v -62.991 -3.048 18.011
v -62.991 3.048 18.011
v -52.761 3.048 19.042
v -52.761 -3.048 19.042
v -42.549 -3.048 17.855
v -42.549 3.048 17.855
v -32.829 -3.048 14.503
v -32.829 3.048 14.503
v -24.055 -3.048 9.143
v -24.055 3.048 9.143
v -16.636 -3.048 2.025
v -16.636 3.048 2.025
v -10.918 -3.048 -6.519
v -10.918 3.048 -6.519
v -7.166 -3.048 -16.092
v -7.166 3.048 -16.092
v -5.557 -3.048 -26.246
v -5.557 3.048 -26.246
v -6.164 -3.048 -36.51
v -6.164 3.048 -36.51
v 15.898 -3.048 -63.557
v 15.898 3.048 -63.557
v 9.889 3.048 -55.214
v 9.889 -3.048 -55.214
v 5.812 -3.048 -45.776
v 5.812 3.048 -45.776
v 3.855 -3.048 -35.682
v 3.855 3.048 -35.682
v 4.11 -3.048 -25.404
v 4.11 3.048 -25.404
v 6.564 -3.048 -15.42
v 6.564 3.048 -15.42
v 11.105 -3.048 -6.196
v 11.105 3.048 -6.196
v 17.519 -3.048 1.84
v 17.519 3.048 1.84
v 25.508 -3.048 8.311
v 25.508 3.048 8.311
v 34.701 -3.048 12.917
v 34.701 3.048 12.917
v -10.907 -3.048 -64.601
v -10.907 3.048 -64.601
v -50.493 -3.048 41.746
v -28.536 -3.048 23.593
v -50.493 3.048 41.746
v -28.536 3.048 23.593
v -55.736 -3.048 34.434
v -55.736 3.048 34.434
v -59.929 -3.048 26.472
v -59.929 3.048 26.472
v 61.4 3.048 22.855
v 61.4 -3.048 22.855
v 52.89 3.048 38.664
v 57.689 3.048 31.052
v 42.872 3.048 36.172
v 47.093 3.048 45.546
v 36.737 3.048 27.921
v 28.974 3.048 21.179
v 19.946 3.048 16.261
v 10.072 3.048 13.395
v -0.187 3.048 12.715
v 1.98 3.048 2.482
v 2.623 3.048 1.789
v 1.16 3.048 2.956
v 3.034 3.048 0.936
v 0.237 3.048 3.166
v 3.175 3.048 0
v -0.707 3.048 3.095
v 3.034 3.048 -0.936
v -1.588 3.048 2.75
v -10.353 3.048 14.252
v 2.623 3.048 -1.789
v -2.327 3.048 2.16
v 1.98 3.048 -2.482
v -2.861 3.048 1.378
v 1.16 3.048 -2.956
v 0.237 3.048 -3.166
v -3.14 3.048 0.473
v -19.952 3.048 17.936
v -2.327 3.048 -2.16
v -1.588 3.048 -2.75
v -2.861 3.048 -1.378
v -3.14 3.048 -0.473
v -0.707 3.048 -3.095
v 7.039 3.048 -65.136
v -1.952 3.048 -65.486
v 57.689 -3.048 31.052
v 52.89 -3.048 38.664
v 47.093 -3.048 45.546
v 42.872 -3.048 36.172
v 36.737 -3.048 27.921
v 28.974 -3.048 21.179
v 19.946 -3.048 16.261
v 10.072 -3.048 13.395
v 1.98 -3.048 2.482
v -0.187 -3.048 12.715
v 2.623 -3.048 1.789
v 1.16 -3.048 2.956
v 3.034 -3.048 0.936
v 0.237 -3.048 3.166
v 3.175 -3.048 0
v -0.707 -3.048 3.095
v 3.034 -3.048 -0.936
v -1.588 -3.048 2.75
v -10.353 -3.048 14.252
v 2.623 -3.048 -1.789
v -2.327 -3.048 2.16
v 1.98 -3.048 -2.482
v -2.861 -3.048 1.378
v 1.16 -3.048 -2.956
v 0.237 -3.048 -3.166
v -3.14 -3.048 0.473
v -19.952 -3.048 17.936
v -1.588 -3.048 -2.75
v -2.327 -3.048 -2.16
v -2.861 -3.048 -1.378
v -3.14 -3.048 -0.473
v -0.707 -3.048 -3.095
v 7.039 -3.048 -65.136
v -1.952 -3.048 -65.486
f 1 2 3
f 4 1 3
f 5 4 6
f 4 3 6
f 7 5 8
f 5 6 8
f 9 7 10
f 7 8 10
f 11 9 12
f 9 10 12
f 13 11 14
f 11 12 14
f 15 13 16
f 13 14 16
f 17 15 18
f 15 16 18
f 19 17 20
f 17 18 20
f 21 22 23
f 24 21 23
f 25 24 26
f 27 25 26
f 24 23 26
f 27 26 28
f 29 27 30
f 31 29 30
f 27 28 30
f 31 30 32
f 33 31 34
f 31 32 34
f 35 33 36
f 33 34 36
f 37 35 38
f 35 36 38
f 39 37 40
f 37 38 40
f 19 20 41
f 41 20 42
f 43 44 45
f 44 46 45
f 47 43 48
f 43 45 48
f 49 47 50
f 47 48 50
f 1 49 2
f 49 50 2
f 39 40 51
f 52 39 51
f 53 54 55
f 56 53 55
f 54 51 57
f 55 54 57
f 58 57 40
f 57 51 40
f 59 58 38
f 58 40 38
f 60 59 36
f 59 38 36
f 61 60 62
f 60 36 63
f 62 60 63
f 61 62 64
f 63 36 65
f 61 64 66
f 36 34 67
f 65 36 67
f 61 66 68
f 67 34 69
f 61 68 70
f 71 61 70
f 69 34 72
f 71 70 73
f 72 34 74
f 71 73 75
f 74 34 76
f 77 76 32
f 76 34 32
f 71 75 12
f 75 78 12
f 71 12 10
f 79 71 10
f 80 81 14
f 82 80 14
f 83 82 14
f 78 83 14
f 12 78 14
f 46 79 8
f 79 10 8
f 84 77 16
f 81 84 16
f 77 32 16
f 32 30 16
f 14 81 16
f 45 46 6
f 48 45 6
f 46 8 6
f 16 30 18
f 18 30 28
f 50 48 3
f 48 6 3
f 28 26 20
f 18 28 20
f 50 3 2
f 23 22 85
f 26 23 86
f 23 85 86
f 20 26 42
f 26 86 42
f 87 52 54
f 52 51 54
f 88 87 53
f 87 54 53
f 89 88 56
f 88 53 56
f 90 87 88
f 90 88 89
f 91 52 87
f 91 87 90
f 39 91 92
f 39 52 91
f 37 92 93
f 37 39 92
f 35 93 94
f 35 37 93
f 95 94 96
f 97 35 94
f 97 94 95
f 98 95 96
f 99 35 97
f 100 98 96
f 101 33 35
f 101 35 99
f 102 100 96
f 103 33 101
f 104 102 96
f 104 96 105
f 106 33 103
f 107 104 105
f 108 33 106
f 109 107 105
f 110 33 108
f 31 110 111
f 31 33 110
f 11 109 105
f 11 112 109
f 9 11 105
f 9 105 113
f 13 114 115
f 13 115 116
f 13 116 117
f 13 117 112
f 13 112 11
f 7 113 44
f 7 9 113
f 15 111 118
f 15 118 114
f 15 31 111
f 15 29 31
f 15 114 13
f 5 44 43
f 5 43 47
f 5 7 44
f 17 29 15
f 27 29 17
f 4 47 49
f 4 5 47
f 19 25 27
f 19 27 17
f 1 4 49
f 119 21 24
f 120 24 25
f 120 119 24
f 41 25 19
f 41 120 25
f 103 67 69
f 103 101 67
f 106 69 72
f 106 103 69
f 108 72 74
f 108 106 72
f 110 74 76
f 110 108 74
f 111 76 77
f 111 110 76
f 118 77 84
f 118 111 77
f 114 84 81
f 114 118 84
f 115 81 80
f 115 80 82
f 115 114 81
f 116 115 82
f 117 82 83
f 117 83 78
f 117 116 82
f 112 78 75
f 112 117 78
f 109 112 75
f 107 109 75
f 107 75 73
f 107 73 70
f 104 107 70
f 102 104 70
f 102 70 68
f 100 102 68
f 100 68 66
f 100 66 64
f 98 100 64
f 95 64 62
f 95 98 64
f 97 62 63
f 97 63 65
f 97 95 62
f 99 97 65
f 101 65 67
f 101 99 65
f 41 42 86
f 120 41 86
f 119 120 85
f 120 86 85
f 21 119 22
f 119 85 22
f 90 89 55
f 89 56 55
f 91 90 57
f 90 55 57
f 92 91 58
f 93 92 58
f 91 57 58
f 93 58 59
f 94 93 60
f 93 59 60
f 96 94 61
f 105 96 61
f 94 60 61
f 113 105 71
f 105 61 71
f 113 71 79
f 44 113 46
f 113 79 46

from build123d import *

# Parameters (mm, degrees)
SKETCH1_R           = 3.175
BOSS_EXTRUDE1_DEPTH = 3.048


with BuildPart() as part:
    # Sketch1 → Boss-Extrude1 (new, symmetric)
    with BuildSketch(Plane(origin=(0, 0, 0), x_dir=(1, 0, 0), z_dir=(0, 1, 0))):
        with BuildLine():
            Line((34.700549349, -12.916534941), (61.399556839, -22.854667611))
            ThreePointArc((61.399556839, -22.854667611), (55.420174256, -34.940602415), (47.093148029, -45.546424892))
            ThreePointArc((47.093148029, -45.546424892), (15.086508303, -14.560725649), (-28.536322062, -23.593289791))
            Line((-28.536322062, -23.593289791), (-50.492501165, -41.746242199))
            ThreePointArc((-50.492501165, -41.746242199), (-57.969536443, -30.52497758), (-62.990935022, -18.010650091))
            ThreePointArc((-62.990935022, -18.010650091), (-20.153212462, -5.78493662), (-6.164227287, 36.509824732))
            Line((-6.164227287, 36.509824732), (-10.907055674, 64.600909809))
            ThreePointArc((-10.907055674, 64.600909809), (2.549362187, 65.465579995), (15.897786993, 63.557074983))
            ThreePointArc((15.897786993, 63.557074983), (5.066704158, 20.34566227), (34.700549349, -12.916534941))
        make_face()
        Circle(SKETCH1_R, mode=Mode.SUBTRACT)
    extrude(amount=BOSS_EXTRUDE1_DEPTH, both=True)


solid = part.part
